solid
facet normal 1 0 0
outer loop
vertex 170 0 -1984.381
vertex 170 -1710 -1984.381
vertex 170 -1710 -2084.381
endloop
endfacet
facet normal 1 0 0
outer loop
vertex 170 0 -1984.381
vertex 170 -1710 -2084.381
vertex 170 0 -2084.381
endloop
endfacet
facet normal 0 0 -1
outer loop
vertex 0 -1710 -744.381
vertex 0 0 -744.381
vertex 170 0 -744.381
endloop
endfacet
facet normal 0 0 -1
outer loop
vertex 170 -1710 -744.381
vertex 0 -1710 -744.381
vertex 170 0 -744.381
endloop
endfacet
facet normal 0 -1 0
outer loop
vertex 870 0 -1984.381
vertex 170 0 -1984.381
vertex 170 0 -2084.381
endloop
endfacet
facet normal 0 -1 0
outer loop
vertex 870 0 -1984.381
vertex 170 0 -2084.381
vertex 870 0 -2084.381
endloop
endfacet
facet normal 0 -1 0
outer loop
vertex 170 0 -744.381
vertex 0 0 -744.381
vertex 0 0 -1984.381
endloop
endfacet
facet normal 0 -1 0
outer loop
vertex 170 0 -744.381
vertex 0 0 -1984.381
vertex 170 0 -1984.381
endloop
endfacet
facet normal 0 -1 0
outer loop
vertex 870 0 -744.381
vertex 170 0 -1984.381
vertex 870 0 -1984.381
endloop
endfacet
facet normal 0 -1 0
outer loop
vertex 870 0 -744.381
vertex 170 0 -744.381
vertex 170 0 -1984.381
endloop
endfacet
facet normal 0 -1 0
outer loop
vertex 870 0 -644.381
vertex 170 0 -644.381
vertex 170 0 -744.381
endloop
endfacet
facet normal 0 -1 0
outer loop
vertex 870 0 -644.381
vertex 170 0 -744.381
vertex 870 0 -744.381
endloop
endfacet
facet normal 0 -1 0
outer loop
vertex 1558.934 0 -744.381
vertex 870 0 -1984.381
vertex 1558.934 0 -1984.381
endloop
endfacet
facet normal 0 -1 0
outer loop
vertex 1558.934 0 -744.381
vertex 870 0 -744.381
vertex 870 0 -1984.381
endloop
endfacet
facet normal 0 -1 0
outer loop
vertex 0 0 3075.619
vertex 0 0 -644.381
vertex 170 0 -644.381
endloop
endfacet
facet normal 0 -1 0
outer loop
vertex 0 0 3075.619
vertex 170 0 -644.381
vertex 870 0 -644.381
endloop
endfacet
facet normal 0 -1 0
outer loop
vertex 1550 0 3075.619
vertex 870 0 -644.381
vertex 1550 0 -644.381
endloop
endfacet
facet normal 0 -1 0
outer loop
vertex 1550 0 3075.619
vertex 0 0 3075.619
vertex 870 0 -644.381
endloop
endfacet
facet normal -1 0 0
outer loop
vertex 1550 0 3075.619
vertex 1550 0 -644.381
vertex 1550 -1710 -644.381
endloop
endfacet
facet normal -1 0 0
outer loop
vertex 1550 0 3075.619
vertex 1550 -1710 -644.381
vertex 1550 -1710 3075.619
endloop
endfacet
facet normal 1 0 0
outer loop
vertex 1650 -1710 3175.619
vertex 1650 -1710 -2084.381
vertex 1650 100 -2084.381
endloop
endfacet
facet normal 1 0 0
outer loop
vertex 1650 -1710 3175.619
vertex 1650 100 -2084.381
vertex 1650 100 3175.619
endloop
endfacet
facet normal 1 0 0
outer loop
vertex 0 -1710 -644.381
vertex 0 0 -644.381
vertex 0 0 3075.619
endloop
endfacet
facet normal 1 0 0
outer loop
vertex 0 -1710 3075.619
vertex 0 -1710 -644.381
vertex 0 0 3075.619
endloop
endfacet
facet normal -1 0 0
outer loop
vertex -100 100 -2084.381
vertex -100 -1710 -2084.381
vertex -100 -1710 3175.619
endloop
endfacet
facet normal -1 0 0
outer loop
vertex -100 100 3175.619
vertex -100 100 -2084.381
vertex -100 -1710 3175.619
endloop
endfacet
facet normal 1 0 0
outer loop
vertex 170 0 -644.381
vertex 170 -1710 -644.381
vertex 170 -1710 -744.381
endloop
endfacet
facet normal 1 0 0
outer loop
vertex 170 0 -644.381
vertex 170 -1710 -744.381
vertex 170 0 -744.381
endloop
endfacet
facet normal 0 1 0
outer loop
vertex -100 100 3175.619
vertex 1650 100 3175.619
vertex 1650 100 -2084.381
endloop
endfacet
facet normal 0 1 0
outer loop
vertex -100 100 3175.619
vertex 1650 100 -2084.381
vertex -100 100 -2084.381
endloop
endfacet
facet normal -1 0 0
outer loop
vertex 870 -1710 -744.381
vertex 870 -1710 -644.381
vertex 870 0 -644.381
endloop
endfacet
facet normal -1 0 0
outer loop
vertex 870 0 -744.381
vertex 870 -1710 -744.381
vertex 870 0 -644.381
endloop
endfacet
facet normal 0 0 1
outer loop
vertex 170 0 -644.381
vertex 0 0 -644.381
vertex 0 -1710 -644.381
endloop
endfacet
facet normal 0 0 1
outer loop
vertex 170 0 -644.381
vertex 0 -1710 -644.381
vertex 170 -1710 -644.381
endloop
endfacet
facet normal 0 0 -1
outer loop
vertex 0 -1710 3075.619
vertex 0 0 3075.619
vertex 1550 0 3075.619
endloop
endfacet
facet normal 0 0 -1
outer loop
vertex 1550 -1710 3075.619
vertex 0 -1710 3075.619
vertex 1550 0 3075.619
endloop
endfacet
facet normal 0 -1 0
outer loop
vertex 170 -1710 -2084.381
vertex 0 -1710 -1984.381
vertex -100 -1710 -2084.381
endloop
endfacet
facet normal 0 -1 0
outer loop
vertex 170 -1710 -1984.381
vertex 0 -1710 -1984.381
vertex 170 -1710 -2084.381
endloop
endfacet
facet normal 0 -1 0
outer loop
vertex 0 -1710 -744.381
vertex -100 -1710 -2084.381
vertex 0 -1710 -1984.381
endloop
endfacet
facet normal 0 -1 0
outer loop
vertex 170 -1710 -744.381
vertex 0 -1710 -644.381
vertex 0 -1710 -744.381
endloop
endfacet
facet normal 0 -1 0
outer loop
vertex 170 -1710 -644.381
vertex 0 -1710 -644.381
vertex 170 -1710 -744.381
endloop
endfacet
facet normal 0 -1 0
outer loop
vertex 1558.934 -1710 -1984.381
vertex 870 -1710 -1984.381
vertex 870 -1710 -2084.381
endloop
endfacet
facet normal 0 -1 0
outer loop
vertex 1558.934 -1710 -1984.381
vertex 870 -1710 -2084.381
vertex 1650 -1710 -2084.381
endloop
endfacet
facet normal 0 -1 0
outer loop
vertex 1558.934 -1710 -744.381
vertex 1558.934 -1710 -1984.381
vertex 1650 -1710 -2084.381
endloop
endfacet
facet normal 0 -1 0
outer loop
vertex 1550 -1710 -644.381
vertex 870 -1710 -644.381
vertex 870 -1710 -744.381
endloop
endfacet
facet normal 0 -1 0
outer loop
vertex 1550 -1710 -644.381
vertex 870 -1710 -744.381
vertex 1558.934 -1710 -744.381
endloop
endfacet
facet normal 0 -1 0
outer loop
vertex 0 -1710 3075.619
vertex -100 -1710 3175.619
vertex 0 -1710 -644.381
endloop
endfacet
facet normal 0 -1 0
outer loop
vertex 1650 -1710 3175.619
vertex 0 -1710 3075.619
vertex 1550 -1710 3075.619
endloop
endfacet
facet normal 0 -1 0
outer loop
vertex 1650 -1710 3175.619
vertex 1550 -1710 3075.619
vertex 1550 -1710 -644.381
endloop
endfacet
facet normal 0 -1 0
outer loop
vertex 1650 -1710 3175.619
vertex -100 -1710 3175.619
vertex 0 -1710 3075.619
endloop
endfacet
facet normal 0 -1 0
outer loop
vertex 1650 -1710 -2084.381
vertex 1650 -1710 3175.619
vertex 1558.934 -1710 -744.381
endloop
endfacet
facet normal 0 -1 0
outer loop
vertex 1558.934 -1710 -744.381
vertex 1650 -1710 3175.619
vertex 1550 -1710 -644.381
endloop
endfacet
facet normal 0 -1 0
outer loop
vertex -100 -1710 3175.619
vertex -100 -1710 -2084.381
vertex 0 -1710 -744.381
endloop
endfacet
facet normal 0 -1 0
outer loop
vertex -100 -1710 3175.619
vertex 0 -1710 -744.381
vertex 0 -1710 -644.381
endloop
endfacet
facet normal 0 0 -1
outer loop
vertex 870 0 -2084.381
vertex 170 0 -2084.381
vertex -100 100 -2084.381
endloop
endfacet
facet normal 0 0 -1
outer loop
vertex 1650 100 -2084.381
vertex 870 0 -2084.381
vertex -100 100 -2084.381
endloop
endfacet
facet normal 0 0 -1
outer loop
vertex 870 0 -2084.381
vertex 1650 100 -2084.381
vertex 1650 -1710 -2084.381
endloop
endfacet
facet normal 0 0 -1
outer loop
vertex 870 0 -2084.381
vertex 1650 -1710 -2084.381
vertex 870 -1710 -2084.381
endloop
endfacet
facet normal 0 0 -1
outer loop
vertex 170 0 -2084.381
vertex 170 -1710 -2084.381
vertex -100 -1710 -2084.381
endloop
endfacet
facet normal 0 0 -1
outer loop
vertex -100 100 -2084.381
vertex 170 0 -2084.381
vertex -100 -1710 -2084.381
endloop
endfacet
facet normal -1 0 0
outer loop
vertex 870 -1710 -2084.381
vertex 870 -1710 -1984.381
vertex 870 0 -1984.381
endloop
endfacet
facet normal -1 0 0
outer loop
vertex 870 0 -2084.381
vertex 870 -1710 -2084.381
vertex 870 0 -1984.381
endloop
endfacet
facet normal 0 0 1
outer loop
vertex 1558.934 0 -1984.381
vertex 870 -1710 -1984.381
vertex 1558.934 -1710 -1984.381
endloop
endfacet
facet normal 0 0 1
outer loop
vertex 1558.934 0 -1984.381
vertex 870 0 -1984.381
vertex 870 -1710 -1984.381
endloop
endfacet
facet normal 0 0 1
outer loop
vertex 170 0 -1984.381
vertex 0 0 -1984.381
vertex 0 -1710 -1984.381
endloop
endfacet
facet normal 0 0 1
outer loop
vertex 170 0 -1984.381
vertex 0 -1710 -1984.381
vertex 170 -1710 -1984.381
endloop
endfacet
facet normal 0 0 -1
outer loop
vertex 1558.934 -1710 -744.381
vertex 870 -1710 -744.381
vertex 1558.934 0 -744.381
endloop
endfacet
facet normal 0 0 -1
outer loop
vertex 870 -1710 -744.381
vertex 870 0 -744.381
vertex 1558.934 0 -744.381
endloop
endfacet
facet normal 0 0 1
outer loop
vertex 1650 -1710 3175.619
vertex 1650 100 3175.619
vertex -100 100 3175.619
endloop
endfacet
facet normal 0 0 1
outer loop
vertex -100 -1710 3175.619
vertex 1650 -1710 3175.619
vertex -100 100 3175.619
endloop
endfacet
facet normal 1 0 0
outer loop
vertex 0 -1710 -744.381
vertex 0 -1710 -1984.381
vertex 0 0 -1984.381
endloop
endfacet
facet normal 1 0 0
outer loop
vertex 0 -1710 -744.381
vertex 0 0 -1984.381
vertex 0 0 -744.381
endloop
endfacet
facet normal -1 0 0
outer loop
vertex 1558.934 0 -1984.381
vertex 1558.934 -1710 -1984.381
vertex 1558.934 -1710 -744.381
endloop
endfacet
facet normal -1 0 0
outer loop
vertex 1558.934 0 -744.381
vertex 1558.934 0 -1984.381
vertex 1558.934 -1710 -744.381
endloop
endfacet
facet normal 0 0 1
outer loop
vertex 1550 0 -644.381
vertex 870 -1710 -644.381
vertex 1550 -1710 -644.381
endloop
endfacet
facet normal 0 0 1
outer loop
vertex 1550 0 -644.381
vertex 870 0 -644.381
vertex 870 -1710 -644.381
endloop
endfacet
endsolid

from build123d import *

# Parameters (mm, degrees)
F0_W     = 1750
F0_H     = 5260
F0_W_2   = 1558.933921
F0_H_2   = 1240
F0_W_3   = 1550
F0_H_3   = 3720
F1_DEPTH = 2700
F2_W     = 1750
F2_H     = 5260
F3_DEPTH = 100
F4_W     = 700
F4_H     = 2200
F5_DEPTH = 3089.338541
F6_W     = 3622.153283
F6_H     = 7279.484034
F6_W_2   = 1750
F6_H_2   = 5260
F6_W_3   = 1558.933921
F6_H_3   = 1240
F6_W_4   = 1550
F6_H_4   = 3720
F7_DEPTH = 990


with BuildPart() as f1:
    # F0 (on Front) → F1 (new body)
    with BuildSketch(Plane.XZ):
        with Locations((775, 545.618997)):
            Rectangle(F0_W, F0_H)
        with Locations((779.46696, -1364.381003)):
            Rectangle(F0_W_2, F0_H_2, mode=Mode.SUBTRACT)
        with Locations((775, 1215.618997)):
            Rectangle(F0_W_3, F0_H_3, mode=Mode.SUBTRACT)
    extrude(amount=F1_DEPTH)

    # F2 (on face) → F3 (join)
    with BuildSketch(Plane(origin=(0, 0, 0), x_dir=(-1, 0, 0), z_dir=(0, 1, 0))):
        with Locations((-775, 545.618997)):
            Rectangle(F2_W, F2_H)
    extrude(amount=F3_DEPTH)

    # F4 (on face) → F5 (cut)
    with BuildSketch(Plane.XY.offset(-644.381003)):
        with Locations((520, -1100)):
            Rectangle(F4_W, F4_H)
    extrude(amount=-F5_DEPTH, mode=Mode.SUBTRACT)

    # F6 (on face) → F7 (cut)
    with BuildSketch(Plane.XZ.offset(2700)):
        with Locations((761.131763, 494.983077)):
            Rectangle(F6_W, F6_H)
        with Locations((775, 545.618997)):
            Rectangle(F6_W_2, F6_H_2, mode=Mode.SUBTRACT)
        with Locations((775, 545.618997)):
            Rectangle(F6_W_2, F6_H_2)
        with Locations((779.46696, -1364.381003)):
            Rectangle(F6_W_3, F6_H_3, mode=Mode.SUBTRACT)
        with Locations((775, 1215.618997)):
            Rectangle(F6_W_4, F6_H_4, mode=Mode.SUBTRACT)
        with Locations((775, 1215.618997)):
            Rectangle(F6_W_4, F6_H_4)
        with Locations((779.46696, -1364.381003)):
            Rectangle(F6_W_3, F6_H_3)
    extrude(amount=-F7_DEPTH, mode=Mode.SUBTRACT)


solid = f1.part
